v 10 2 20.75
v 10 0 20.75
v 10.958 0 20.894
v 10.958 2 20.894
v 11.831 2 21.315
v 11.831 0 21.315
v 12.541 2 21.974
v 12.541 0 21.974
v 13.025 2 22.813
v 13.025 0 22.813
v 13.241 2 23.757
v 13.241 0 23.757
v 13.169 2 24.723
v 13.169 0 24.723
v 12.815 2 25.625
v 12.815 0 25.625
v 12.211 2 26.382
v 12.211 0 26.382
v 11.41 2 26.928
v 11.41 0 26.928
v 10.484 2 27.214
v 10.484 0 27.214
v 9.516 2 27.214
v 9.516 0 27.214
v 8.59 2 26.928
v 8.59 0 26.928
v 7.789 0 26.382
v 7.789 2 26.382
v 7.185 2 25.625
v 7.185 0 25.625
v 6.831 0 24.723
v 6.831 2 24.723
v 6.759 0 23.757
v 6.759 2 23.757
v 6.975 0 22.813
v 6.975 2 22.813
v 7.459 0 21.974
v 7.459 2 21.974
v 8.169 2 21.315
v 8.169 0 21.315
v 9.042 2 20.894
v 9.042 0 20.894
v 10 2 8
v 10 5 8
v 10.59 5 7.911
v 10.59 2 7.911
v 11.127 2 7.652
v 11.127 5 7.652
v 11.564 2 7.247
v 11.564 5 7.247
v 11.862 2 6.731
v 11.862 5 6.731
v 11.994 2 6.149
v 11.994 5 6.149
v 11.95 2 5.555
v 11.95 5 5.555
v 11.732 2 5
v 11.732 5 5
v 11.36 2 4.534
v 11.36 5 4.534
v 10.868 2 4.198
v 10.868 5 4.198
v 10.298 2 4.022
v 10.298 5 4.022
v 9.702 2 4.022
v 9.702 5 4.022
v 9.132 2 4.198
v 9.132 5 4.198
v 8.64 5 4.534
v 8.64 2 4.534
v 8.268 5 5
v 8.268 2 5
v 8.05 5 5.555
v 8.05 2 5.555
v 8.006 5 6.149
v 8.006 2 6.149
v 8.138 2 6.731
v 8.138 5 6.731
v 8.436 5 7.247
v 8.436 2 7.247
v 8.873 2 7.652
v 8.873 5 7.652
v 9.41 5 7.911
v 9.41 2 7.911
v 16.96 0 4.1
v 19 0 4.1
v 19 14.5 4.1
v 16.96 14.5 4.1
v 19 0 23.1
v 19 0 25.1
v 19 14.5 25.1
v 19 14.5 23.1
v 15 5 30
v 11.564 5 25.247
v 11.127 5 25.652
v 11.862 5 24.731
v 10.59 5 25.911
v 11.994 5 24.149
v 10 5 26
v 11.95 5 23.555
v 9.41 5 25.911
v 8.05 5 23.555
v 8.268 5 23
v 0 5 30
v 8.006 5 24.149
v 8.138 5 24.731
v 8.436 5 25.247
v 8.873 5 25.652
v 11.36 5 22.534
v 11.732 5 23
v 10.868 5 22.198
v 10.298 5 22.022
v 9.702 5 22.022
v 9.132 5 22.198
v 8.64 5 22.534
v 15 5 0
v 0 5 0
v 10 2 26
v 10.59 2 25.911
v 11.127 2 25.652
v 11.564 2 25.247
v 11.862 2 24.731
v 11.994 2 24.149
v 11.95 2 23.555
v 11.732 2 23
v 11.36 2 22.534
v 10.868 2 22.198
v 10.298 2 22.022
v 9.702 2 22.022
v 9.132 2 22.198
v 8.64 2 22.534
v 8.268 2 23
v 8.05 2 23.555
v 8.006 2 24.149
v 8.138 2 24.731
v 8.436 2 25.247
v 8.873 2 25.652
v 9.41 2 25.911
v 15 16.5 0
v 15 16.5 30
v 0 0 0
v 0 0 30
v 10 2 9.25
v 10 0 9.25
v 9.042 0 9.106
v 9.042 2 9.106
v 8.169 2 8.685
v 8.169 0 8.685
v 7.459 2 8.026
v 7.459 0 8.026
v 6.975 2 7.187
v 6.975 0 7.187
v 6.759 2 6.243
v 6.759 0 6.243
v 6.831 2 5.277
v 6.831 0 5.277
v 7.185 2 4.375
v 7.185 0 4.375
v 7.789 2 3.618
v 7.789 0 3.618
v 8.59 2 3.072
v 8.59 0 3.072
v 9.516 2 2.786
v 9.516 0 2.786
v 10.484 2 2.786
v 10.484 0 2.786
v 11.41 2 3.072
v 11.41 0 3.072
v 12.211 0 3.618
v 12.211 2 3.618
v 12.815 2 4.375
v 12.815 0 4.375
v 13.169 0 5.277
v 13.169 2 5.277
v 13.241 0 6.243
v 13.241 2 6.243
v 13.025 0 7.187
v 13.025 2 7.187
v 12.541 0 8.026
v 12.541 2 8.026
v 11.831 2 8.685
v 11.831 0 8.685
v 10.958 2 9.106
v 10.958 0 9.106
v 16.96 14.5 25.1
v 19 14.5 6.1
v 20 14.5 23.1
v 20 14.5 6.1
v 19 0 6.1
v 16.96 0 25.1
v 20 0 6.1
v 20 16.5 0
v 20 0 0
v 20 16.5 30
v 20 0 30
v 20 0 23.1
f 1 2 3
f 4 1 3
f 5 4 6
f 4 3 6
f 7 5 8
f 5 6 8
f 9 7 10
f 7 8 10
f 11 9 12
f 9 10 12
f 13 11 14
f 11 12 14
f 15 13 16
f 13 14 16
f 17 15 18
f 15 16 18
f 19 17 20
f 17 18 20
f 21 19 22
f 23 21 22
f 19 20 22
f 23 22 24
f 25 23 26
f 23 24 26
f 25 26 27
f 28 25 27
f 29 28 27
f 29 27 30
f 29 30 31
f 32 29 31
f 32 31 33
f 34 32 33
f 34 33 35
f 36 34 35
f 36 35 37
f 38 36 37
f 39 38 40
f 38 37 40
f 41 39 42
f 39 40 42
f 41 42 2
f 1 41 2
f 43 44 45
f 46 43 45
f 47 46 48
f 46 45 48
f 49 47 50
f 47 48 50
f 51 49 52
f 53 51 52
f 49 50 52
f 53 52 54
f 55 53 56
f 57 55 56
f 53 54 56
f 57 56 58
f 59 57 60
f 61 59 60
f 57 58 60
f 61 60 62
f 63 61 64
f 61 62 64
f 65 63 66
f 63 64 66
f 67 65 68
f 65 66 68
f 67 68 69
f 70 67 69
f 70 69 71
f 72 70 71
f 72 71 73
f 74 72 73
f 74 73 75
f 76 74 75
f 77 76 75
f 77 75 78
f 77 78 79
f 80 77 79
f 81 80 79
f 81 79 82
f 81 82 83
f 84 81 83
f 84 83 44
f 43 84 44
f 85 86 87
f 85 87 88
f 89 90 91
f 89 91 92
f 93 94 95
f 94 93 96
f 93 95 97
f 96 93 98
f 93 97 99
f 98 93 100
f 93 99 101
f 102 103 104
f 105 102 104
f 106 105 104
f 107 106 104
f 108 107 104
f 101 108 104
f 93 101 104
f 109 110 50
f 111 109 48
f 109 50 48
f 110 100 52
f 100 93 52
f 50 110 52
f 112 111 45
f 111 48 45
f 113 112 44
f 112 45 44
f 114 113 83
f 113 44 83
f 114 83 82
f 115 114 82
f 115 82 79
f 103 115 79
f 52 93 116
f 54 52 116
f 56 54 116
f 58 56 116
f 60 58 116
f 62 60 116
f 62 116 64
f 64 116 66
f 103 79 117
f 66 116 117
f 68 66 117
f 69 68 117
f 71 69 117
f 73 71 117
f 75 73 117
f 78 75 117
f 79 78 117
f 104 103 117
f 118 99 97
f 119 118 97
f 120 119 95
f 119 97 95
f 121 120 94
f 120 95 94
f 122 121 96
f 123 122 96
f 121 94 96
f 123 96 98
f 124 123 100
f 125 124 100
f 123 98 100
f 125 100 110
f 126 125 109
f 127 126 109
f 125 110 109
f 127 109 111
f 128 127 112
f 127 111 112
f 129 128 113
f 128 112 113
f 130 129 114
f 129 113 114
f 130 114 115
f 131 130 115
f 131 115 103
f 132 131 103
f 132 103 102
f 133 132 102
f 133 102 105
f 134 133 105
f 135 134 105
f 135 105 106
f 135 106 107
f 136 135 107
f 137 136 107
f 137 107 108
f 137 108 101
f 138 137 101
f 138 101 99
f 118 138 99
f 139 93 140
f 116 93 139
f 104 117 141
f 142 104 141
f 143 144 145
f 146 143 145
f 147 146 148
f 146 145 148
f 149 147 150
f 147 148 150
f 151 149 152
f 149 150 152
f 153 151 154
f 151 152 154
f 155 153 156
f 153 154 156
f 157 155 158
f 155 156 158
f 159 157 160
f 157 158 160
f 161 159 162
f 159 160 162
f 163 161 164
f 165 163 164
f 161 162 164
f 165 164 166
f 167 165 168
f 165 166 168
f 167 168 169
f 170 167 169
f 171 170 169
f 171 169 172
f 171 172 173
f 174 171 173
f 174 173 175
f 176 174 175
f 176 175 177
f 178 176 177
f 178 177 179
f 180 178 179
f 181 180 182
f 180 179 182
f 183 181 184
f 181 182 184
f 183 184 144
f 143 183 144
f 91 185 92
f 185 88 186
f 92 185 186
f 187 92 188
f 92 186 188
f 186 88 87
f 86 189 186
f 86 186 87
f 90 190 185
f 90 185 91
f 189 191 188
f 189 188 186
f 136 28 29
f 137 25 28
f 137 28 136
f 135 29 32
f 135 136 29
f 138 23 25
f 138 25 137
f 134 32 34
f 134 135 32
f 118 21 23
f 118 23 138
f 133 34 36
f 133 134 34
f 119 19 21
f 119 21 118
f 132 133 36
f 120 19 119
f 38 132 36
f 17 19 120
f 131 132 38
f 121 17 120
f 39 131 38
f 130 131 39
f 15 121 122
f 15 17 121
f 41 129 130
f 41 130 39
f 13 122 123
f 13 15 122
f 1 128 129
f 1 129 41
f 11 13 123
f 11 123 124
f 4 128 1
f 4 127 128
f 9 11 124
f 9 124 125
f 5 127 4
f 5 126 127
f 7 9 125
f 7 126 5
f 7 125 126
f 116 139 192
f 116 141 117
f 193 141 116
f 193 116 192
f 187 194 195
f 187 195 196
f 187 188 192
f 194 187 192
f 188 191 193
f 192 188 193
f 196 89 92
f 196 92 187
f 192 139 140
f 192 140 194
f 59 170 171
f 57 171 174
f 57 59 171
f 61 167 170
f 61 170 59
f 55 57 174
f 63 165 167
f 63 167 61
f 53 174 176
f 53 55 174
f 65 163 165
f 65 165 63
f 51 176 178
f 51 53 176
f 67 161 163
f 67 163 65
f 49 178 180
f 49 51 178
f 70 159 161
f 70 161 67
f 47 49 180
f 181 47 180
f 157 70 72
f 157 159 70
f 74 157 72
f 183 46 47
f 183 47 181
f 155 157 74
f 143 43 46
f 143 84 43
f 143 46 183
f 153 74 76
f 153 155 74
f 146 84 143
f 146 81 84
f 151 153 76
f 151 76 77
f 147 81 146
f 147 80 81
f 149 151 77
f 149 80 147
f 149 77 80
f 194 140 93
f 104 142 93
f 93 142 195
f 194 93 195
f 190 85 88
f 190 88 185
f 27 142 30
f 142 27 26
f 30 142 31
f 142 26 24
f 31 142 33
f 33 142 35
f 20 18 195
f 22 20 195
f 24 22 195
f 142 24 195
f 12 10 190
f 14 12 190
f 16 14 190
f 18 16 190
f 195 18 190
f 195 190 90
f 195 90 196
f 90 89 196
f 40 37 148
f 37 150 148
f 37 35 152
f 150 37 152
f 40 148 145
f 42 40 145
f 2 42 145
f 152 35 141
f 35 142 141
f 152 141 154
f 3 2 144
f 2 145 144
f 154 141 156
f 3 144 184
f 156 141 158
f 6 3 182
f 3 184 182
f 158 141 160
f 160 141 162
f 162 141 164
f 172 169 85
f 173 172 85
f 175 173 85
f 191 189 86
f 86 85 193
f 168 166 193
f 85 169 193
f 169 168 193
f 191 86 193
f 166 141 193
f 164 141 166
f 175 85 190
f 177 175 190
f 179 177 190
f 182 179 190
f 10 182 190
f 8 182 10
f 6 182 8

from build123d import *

# Parameters (mm, degrees)
SALIENTE_EXTRUIR1_DEPTH = 30
CORTAR_EXTRUIR1_REACH   = 40.862
CORTAR_EXTRUIR2_REACH   = 39.286
CROQUIS3_R              = 2
CROQUIS4_R              = 3.25
CORTAR_EXTRUIR3_DEPTH   = 2
CROQUIS5_W              = 5
CROQUIS5_H              = 30
SALIENTE_EXTRUIR2_DEPTH = 2


with BuildPart() as part:
    # Croquis1 → Saliente-Extruir1 (new body)
    with BuildSketch(Plane.XY):
        Polygon((20, 0), (20, 14.5), (15, 14.5), (15, 5), (0, 5), (0, 0), align=None)
    extrude(amount=SALIENTE_EXTRUIR1_DEPTH)

    # Croquis2 → Cortar-Extruir1 (cut, up to next)
    with BuildSketch(Plane(origin=(0, 14.5, 0), x_dir=(1, 0, 0), z_dir=(0, 1, 0)), mode=Mode.PRIVATE) as cortar_extruir1_sk1:
        Polygon((20, -23.1), (20, -15), (20, -6.1), (19, -6.1), (19, -4.1), (16.96, -4.1), (16.96, -25.1), (19, -25.1), (19, -23.1), align=None)
    cortar_extruir1_tool1 = extrude(cortar_extruir1_sk1.sketch, amount=-CORTAR_EXTRUIR1_REACH, mode=Mode.PRIVATE) & part.part
    add(cortar_extruir1_tool1.solids().sort_by_distance((18.411818, 14.5, 14.6))[0], mode=Mode.SUBTRACT)

    # Croquis3 → Cortar-Extruir2 (cut, up to next)
    with BuildSketch(Plane(origin=(0, 5, 0), x_dir=(1, 0, 0), z_dir=(0, 1, 0)), mode=Mode.PRIVATE) as cortar_extruir2_sk1:
        with Locations((10, -6)):
            Circle(CROQUIS3_R)
    cortar_extruir2_tool1 = extrude(cortar_extruir2_sk1.sketch, amount=-CORTAR_EXTRUIR2_REACH, mode=Mode.PRIVATE) & part.part
    # Croquis3 → Cortar-Extruir2 (cut, up to next)
    with BuildSketch(Plane(origin=(0, 5, 0), x_dir=(1, 0, 0), z_dir=(0, 1, 0)), mode=Mode.PRIVATE) as cortar_extruir2_sk2:
        with Locations((10, -24)):
            Circle(CROQUIS3_R)
    cortar_extruir2_tool2 = extrude(cortar_extruir2_sk2.sketch, amount=-CORTAR_EXTRUIR2_REACH, mode=Mode.PRIVATE) & part.part
    add(cortar_extruir2_tool1.solids().sort_by_distance((10, 5, 6))[0], mode=Mode.SUBTRACT)
    add(cortar_extruir2_tool2.solids().sort_by_distance((10, 5, 24))[0], mode=Mode.SUBTRACT)

    # Croquis4 → Cortar-Extruir3 (cut)
    with BuildSketch(Plane.XZ):
        with Locations((10, 24)):
            Circle(CROQUIS4_R)
        with Locations((10, 6)):
            Circle(CROQUIS4_R)
    extrude(amount=-CORTAR_EXTRUIR3_DEPTH, mode=Mode.SUBTRACT)

    # Croquis5 → Saliente-Extruir2 (add)
    with BuildSketch(Plane(origin=(0, 14.5, 0), x_dir=(1, 0, 0), z_dir=(0, 1, 0))):
        with Locations((17.5, -15)):
            Rectangle(CROQUIS5_W, CROQUIS5_H)
    extrude(amount=SALIENTE_EXTRUIR2_DEPTH)


solid = part.part
